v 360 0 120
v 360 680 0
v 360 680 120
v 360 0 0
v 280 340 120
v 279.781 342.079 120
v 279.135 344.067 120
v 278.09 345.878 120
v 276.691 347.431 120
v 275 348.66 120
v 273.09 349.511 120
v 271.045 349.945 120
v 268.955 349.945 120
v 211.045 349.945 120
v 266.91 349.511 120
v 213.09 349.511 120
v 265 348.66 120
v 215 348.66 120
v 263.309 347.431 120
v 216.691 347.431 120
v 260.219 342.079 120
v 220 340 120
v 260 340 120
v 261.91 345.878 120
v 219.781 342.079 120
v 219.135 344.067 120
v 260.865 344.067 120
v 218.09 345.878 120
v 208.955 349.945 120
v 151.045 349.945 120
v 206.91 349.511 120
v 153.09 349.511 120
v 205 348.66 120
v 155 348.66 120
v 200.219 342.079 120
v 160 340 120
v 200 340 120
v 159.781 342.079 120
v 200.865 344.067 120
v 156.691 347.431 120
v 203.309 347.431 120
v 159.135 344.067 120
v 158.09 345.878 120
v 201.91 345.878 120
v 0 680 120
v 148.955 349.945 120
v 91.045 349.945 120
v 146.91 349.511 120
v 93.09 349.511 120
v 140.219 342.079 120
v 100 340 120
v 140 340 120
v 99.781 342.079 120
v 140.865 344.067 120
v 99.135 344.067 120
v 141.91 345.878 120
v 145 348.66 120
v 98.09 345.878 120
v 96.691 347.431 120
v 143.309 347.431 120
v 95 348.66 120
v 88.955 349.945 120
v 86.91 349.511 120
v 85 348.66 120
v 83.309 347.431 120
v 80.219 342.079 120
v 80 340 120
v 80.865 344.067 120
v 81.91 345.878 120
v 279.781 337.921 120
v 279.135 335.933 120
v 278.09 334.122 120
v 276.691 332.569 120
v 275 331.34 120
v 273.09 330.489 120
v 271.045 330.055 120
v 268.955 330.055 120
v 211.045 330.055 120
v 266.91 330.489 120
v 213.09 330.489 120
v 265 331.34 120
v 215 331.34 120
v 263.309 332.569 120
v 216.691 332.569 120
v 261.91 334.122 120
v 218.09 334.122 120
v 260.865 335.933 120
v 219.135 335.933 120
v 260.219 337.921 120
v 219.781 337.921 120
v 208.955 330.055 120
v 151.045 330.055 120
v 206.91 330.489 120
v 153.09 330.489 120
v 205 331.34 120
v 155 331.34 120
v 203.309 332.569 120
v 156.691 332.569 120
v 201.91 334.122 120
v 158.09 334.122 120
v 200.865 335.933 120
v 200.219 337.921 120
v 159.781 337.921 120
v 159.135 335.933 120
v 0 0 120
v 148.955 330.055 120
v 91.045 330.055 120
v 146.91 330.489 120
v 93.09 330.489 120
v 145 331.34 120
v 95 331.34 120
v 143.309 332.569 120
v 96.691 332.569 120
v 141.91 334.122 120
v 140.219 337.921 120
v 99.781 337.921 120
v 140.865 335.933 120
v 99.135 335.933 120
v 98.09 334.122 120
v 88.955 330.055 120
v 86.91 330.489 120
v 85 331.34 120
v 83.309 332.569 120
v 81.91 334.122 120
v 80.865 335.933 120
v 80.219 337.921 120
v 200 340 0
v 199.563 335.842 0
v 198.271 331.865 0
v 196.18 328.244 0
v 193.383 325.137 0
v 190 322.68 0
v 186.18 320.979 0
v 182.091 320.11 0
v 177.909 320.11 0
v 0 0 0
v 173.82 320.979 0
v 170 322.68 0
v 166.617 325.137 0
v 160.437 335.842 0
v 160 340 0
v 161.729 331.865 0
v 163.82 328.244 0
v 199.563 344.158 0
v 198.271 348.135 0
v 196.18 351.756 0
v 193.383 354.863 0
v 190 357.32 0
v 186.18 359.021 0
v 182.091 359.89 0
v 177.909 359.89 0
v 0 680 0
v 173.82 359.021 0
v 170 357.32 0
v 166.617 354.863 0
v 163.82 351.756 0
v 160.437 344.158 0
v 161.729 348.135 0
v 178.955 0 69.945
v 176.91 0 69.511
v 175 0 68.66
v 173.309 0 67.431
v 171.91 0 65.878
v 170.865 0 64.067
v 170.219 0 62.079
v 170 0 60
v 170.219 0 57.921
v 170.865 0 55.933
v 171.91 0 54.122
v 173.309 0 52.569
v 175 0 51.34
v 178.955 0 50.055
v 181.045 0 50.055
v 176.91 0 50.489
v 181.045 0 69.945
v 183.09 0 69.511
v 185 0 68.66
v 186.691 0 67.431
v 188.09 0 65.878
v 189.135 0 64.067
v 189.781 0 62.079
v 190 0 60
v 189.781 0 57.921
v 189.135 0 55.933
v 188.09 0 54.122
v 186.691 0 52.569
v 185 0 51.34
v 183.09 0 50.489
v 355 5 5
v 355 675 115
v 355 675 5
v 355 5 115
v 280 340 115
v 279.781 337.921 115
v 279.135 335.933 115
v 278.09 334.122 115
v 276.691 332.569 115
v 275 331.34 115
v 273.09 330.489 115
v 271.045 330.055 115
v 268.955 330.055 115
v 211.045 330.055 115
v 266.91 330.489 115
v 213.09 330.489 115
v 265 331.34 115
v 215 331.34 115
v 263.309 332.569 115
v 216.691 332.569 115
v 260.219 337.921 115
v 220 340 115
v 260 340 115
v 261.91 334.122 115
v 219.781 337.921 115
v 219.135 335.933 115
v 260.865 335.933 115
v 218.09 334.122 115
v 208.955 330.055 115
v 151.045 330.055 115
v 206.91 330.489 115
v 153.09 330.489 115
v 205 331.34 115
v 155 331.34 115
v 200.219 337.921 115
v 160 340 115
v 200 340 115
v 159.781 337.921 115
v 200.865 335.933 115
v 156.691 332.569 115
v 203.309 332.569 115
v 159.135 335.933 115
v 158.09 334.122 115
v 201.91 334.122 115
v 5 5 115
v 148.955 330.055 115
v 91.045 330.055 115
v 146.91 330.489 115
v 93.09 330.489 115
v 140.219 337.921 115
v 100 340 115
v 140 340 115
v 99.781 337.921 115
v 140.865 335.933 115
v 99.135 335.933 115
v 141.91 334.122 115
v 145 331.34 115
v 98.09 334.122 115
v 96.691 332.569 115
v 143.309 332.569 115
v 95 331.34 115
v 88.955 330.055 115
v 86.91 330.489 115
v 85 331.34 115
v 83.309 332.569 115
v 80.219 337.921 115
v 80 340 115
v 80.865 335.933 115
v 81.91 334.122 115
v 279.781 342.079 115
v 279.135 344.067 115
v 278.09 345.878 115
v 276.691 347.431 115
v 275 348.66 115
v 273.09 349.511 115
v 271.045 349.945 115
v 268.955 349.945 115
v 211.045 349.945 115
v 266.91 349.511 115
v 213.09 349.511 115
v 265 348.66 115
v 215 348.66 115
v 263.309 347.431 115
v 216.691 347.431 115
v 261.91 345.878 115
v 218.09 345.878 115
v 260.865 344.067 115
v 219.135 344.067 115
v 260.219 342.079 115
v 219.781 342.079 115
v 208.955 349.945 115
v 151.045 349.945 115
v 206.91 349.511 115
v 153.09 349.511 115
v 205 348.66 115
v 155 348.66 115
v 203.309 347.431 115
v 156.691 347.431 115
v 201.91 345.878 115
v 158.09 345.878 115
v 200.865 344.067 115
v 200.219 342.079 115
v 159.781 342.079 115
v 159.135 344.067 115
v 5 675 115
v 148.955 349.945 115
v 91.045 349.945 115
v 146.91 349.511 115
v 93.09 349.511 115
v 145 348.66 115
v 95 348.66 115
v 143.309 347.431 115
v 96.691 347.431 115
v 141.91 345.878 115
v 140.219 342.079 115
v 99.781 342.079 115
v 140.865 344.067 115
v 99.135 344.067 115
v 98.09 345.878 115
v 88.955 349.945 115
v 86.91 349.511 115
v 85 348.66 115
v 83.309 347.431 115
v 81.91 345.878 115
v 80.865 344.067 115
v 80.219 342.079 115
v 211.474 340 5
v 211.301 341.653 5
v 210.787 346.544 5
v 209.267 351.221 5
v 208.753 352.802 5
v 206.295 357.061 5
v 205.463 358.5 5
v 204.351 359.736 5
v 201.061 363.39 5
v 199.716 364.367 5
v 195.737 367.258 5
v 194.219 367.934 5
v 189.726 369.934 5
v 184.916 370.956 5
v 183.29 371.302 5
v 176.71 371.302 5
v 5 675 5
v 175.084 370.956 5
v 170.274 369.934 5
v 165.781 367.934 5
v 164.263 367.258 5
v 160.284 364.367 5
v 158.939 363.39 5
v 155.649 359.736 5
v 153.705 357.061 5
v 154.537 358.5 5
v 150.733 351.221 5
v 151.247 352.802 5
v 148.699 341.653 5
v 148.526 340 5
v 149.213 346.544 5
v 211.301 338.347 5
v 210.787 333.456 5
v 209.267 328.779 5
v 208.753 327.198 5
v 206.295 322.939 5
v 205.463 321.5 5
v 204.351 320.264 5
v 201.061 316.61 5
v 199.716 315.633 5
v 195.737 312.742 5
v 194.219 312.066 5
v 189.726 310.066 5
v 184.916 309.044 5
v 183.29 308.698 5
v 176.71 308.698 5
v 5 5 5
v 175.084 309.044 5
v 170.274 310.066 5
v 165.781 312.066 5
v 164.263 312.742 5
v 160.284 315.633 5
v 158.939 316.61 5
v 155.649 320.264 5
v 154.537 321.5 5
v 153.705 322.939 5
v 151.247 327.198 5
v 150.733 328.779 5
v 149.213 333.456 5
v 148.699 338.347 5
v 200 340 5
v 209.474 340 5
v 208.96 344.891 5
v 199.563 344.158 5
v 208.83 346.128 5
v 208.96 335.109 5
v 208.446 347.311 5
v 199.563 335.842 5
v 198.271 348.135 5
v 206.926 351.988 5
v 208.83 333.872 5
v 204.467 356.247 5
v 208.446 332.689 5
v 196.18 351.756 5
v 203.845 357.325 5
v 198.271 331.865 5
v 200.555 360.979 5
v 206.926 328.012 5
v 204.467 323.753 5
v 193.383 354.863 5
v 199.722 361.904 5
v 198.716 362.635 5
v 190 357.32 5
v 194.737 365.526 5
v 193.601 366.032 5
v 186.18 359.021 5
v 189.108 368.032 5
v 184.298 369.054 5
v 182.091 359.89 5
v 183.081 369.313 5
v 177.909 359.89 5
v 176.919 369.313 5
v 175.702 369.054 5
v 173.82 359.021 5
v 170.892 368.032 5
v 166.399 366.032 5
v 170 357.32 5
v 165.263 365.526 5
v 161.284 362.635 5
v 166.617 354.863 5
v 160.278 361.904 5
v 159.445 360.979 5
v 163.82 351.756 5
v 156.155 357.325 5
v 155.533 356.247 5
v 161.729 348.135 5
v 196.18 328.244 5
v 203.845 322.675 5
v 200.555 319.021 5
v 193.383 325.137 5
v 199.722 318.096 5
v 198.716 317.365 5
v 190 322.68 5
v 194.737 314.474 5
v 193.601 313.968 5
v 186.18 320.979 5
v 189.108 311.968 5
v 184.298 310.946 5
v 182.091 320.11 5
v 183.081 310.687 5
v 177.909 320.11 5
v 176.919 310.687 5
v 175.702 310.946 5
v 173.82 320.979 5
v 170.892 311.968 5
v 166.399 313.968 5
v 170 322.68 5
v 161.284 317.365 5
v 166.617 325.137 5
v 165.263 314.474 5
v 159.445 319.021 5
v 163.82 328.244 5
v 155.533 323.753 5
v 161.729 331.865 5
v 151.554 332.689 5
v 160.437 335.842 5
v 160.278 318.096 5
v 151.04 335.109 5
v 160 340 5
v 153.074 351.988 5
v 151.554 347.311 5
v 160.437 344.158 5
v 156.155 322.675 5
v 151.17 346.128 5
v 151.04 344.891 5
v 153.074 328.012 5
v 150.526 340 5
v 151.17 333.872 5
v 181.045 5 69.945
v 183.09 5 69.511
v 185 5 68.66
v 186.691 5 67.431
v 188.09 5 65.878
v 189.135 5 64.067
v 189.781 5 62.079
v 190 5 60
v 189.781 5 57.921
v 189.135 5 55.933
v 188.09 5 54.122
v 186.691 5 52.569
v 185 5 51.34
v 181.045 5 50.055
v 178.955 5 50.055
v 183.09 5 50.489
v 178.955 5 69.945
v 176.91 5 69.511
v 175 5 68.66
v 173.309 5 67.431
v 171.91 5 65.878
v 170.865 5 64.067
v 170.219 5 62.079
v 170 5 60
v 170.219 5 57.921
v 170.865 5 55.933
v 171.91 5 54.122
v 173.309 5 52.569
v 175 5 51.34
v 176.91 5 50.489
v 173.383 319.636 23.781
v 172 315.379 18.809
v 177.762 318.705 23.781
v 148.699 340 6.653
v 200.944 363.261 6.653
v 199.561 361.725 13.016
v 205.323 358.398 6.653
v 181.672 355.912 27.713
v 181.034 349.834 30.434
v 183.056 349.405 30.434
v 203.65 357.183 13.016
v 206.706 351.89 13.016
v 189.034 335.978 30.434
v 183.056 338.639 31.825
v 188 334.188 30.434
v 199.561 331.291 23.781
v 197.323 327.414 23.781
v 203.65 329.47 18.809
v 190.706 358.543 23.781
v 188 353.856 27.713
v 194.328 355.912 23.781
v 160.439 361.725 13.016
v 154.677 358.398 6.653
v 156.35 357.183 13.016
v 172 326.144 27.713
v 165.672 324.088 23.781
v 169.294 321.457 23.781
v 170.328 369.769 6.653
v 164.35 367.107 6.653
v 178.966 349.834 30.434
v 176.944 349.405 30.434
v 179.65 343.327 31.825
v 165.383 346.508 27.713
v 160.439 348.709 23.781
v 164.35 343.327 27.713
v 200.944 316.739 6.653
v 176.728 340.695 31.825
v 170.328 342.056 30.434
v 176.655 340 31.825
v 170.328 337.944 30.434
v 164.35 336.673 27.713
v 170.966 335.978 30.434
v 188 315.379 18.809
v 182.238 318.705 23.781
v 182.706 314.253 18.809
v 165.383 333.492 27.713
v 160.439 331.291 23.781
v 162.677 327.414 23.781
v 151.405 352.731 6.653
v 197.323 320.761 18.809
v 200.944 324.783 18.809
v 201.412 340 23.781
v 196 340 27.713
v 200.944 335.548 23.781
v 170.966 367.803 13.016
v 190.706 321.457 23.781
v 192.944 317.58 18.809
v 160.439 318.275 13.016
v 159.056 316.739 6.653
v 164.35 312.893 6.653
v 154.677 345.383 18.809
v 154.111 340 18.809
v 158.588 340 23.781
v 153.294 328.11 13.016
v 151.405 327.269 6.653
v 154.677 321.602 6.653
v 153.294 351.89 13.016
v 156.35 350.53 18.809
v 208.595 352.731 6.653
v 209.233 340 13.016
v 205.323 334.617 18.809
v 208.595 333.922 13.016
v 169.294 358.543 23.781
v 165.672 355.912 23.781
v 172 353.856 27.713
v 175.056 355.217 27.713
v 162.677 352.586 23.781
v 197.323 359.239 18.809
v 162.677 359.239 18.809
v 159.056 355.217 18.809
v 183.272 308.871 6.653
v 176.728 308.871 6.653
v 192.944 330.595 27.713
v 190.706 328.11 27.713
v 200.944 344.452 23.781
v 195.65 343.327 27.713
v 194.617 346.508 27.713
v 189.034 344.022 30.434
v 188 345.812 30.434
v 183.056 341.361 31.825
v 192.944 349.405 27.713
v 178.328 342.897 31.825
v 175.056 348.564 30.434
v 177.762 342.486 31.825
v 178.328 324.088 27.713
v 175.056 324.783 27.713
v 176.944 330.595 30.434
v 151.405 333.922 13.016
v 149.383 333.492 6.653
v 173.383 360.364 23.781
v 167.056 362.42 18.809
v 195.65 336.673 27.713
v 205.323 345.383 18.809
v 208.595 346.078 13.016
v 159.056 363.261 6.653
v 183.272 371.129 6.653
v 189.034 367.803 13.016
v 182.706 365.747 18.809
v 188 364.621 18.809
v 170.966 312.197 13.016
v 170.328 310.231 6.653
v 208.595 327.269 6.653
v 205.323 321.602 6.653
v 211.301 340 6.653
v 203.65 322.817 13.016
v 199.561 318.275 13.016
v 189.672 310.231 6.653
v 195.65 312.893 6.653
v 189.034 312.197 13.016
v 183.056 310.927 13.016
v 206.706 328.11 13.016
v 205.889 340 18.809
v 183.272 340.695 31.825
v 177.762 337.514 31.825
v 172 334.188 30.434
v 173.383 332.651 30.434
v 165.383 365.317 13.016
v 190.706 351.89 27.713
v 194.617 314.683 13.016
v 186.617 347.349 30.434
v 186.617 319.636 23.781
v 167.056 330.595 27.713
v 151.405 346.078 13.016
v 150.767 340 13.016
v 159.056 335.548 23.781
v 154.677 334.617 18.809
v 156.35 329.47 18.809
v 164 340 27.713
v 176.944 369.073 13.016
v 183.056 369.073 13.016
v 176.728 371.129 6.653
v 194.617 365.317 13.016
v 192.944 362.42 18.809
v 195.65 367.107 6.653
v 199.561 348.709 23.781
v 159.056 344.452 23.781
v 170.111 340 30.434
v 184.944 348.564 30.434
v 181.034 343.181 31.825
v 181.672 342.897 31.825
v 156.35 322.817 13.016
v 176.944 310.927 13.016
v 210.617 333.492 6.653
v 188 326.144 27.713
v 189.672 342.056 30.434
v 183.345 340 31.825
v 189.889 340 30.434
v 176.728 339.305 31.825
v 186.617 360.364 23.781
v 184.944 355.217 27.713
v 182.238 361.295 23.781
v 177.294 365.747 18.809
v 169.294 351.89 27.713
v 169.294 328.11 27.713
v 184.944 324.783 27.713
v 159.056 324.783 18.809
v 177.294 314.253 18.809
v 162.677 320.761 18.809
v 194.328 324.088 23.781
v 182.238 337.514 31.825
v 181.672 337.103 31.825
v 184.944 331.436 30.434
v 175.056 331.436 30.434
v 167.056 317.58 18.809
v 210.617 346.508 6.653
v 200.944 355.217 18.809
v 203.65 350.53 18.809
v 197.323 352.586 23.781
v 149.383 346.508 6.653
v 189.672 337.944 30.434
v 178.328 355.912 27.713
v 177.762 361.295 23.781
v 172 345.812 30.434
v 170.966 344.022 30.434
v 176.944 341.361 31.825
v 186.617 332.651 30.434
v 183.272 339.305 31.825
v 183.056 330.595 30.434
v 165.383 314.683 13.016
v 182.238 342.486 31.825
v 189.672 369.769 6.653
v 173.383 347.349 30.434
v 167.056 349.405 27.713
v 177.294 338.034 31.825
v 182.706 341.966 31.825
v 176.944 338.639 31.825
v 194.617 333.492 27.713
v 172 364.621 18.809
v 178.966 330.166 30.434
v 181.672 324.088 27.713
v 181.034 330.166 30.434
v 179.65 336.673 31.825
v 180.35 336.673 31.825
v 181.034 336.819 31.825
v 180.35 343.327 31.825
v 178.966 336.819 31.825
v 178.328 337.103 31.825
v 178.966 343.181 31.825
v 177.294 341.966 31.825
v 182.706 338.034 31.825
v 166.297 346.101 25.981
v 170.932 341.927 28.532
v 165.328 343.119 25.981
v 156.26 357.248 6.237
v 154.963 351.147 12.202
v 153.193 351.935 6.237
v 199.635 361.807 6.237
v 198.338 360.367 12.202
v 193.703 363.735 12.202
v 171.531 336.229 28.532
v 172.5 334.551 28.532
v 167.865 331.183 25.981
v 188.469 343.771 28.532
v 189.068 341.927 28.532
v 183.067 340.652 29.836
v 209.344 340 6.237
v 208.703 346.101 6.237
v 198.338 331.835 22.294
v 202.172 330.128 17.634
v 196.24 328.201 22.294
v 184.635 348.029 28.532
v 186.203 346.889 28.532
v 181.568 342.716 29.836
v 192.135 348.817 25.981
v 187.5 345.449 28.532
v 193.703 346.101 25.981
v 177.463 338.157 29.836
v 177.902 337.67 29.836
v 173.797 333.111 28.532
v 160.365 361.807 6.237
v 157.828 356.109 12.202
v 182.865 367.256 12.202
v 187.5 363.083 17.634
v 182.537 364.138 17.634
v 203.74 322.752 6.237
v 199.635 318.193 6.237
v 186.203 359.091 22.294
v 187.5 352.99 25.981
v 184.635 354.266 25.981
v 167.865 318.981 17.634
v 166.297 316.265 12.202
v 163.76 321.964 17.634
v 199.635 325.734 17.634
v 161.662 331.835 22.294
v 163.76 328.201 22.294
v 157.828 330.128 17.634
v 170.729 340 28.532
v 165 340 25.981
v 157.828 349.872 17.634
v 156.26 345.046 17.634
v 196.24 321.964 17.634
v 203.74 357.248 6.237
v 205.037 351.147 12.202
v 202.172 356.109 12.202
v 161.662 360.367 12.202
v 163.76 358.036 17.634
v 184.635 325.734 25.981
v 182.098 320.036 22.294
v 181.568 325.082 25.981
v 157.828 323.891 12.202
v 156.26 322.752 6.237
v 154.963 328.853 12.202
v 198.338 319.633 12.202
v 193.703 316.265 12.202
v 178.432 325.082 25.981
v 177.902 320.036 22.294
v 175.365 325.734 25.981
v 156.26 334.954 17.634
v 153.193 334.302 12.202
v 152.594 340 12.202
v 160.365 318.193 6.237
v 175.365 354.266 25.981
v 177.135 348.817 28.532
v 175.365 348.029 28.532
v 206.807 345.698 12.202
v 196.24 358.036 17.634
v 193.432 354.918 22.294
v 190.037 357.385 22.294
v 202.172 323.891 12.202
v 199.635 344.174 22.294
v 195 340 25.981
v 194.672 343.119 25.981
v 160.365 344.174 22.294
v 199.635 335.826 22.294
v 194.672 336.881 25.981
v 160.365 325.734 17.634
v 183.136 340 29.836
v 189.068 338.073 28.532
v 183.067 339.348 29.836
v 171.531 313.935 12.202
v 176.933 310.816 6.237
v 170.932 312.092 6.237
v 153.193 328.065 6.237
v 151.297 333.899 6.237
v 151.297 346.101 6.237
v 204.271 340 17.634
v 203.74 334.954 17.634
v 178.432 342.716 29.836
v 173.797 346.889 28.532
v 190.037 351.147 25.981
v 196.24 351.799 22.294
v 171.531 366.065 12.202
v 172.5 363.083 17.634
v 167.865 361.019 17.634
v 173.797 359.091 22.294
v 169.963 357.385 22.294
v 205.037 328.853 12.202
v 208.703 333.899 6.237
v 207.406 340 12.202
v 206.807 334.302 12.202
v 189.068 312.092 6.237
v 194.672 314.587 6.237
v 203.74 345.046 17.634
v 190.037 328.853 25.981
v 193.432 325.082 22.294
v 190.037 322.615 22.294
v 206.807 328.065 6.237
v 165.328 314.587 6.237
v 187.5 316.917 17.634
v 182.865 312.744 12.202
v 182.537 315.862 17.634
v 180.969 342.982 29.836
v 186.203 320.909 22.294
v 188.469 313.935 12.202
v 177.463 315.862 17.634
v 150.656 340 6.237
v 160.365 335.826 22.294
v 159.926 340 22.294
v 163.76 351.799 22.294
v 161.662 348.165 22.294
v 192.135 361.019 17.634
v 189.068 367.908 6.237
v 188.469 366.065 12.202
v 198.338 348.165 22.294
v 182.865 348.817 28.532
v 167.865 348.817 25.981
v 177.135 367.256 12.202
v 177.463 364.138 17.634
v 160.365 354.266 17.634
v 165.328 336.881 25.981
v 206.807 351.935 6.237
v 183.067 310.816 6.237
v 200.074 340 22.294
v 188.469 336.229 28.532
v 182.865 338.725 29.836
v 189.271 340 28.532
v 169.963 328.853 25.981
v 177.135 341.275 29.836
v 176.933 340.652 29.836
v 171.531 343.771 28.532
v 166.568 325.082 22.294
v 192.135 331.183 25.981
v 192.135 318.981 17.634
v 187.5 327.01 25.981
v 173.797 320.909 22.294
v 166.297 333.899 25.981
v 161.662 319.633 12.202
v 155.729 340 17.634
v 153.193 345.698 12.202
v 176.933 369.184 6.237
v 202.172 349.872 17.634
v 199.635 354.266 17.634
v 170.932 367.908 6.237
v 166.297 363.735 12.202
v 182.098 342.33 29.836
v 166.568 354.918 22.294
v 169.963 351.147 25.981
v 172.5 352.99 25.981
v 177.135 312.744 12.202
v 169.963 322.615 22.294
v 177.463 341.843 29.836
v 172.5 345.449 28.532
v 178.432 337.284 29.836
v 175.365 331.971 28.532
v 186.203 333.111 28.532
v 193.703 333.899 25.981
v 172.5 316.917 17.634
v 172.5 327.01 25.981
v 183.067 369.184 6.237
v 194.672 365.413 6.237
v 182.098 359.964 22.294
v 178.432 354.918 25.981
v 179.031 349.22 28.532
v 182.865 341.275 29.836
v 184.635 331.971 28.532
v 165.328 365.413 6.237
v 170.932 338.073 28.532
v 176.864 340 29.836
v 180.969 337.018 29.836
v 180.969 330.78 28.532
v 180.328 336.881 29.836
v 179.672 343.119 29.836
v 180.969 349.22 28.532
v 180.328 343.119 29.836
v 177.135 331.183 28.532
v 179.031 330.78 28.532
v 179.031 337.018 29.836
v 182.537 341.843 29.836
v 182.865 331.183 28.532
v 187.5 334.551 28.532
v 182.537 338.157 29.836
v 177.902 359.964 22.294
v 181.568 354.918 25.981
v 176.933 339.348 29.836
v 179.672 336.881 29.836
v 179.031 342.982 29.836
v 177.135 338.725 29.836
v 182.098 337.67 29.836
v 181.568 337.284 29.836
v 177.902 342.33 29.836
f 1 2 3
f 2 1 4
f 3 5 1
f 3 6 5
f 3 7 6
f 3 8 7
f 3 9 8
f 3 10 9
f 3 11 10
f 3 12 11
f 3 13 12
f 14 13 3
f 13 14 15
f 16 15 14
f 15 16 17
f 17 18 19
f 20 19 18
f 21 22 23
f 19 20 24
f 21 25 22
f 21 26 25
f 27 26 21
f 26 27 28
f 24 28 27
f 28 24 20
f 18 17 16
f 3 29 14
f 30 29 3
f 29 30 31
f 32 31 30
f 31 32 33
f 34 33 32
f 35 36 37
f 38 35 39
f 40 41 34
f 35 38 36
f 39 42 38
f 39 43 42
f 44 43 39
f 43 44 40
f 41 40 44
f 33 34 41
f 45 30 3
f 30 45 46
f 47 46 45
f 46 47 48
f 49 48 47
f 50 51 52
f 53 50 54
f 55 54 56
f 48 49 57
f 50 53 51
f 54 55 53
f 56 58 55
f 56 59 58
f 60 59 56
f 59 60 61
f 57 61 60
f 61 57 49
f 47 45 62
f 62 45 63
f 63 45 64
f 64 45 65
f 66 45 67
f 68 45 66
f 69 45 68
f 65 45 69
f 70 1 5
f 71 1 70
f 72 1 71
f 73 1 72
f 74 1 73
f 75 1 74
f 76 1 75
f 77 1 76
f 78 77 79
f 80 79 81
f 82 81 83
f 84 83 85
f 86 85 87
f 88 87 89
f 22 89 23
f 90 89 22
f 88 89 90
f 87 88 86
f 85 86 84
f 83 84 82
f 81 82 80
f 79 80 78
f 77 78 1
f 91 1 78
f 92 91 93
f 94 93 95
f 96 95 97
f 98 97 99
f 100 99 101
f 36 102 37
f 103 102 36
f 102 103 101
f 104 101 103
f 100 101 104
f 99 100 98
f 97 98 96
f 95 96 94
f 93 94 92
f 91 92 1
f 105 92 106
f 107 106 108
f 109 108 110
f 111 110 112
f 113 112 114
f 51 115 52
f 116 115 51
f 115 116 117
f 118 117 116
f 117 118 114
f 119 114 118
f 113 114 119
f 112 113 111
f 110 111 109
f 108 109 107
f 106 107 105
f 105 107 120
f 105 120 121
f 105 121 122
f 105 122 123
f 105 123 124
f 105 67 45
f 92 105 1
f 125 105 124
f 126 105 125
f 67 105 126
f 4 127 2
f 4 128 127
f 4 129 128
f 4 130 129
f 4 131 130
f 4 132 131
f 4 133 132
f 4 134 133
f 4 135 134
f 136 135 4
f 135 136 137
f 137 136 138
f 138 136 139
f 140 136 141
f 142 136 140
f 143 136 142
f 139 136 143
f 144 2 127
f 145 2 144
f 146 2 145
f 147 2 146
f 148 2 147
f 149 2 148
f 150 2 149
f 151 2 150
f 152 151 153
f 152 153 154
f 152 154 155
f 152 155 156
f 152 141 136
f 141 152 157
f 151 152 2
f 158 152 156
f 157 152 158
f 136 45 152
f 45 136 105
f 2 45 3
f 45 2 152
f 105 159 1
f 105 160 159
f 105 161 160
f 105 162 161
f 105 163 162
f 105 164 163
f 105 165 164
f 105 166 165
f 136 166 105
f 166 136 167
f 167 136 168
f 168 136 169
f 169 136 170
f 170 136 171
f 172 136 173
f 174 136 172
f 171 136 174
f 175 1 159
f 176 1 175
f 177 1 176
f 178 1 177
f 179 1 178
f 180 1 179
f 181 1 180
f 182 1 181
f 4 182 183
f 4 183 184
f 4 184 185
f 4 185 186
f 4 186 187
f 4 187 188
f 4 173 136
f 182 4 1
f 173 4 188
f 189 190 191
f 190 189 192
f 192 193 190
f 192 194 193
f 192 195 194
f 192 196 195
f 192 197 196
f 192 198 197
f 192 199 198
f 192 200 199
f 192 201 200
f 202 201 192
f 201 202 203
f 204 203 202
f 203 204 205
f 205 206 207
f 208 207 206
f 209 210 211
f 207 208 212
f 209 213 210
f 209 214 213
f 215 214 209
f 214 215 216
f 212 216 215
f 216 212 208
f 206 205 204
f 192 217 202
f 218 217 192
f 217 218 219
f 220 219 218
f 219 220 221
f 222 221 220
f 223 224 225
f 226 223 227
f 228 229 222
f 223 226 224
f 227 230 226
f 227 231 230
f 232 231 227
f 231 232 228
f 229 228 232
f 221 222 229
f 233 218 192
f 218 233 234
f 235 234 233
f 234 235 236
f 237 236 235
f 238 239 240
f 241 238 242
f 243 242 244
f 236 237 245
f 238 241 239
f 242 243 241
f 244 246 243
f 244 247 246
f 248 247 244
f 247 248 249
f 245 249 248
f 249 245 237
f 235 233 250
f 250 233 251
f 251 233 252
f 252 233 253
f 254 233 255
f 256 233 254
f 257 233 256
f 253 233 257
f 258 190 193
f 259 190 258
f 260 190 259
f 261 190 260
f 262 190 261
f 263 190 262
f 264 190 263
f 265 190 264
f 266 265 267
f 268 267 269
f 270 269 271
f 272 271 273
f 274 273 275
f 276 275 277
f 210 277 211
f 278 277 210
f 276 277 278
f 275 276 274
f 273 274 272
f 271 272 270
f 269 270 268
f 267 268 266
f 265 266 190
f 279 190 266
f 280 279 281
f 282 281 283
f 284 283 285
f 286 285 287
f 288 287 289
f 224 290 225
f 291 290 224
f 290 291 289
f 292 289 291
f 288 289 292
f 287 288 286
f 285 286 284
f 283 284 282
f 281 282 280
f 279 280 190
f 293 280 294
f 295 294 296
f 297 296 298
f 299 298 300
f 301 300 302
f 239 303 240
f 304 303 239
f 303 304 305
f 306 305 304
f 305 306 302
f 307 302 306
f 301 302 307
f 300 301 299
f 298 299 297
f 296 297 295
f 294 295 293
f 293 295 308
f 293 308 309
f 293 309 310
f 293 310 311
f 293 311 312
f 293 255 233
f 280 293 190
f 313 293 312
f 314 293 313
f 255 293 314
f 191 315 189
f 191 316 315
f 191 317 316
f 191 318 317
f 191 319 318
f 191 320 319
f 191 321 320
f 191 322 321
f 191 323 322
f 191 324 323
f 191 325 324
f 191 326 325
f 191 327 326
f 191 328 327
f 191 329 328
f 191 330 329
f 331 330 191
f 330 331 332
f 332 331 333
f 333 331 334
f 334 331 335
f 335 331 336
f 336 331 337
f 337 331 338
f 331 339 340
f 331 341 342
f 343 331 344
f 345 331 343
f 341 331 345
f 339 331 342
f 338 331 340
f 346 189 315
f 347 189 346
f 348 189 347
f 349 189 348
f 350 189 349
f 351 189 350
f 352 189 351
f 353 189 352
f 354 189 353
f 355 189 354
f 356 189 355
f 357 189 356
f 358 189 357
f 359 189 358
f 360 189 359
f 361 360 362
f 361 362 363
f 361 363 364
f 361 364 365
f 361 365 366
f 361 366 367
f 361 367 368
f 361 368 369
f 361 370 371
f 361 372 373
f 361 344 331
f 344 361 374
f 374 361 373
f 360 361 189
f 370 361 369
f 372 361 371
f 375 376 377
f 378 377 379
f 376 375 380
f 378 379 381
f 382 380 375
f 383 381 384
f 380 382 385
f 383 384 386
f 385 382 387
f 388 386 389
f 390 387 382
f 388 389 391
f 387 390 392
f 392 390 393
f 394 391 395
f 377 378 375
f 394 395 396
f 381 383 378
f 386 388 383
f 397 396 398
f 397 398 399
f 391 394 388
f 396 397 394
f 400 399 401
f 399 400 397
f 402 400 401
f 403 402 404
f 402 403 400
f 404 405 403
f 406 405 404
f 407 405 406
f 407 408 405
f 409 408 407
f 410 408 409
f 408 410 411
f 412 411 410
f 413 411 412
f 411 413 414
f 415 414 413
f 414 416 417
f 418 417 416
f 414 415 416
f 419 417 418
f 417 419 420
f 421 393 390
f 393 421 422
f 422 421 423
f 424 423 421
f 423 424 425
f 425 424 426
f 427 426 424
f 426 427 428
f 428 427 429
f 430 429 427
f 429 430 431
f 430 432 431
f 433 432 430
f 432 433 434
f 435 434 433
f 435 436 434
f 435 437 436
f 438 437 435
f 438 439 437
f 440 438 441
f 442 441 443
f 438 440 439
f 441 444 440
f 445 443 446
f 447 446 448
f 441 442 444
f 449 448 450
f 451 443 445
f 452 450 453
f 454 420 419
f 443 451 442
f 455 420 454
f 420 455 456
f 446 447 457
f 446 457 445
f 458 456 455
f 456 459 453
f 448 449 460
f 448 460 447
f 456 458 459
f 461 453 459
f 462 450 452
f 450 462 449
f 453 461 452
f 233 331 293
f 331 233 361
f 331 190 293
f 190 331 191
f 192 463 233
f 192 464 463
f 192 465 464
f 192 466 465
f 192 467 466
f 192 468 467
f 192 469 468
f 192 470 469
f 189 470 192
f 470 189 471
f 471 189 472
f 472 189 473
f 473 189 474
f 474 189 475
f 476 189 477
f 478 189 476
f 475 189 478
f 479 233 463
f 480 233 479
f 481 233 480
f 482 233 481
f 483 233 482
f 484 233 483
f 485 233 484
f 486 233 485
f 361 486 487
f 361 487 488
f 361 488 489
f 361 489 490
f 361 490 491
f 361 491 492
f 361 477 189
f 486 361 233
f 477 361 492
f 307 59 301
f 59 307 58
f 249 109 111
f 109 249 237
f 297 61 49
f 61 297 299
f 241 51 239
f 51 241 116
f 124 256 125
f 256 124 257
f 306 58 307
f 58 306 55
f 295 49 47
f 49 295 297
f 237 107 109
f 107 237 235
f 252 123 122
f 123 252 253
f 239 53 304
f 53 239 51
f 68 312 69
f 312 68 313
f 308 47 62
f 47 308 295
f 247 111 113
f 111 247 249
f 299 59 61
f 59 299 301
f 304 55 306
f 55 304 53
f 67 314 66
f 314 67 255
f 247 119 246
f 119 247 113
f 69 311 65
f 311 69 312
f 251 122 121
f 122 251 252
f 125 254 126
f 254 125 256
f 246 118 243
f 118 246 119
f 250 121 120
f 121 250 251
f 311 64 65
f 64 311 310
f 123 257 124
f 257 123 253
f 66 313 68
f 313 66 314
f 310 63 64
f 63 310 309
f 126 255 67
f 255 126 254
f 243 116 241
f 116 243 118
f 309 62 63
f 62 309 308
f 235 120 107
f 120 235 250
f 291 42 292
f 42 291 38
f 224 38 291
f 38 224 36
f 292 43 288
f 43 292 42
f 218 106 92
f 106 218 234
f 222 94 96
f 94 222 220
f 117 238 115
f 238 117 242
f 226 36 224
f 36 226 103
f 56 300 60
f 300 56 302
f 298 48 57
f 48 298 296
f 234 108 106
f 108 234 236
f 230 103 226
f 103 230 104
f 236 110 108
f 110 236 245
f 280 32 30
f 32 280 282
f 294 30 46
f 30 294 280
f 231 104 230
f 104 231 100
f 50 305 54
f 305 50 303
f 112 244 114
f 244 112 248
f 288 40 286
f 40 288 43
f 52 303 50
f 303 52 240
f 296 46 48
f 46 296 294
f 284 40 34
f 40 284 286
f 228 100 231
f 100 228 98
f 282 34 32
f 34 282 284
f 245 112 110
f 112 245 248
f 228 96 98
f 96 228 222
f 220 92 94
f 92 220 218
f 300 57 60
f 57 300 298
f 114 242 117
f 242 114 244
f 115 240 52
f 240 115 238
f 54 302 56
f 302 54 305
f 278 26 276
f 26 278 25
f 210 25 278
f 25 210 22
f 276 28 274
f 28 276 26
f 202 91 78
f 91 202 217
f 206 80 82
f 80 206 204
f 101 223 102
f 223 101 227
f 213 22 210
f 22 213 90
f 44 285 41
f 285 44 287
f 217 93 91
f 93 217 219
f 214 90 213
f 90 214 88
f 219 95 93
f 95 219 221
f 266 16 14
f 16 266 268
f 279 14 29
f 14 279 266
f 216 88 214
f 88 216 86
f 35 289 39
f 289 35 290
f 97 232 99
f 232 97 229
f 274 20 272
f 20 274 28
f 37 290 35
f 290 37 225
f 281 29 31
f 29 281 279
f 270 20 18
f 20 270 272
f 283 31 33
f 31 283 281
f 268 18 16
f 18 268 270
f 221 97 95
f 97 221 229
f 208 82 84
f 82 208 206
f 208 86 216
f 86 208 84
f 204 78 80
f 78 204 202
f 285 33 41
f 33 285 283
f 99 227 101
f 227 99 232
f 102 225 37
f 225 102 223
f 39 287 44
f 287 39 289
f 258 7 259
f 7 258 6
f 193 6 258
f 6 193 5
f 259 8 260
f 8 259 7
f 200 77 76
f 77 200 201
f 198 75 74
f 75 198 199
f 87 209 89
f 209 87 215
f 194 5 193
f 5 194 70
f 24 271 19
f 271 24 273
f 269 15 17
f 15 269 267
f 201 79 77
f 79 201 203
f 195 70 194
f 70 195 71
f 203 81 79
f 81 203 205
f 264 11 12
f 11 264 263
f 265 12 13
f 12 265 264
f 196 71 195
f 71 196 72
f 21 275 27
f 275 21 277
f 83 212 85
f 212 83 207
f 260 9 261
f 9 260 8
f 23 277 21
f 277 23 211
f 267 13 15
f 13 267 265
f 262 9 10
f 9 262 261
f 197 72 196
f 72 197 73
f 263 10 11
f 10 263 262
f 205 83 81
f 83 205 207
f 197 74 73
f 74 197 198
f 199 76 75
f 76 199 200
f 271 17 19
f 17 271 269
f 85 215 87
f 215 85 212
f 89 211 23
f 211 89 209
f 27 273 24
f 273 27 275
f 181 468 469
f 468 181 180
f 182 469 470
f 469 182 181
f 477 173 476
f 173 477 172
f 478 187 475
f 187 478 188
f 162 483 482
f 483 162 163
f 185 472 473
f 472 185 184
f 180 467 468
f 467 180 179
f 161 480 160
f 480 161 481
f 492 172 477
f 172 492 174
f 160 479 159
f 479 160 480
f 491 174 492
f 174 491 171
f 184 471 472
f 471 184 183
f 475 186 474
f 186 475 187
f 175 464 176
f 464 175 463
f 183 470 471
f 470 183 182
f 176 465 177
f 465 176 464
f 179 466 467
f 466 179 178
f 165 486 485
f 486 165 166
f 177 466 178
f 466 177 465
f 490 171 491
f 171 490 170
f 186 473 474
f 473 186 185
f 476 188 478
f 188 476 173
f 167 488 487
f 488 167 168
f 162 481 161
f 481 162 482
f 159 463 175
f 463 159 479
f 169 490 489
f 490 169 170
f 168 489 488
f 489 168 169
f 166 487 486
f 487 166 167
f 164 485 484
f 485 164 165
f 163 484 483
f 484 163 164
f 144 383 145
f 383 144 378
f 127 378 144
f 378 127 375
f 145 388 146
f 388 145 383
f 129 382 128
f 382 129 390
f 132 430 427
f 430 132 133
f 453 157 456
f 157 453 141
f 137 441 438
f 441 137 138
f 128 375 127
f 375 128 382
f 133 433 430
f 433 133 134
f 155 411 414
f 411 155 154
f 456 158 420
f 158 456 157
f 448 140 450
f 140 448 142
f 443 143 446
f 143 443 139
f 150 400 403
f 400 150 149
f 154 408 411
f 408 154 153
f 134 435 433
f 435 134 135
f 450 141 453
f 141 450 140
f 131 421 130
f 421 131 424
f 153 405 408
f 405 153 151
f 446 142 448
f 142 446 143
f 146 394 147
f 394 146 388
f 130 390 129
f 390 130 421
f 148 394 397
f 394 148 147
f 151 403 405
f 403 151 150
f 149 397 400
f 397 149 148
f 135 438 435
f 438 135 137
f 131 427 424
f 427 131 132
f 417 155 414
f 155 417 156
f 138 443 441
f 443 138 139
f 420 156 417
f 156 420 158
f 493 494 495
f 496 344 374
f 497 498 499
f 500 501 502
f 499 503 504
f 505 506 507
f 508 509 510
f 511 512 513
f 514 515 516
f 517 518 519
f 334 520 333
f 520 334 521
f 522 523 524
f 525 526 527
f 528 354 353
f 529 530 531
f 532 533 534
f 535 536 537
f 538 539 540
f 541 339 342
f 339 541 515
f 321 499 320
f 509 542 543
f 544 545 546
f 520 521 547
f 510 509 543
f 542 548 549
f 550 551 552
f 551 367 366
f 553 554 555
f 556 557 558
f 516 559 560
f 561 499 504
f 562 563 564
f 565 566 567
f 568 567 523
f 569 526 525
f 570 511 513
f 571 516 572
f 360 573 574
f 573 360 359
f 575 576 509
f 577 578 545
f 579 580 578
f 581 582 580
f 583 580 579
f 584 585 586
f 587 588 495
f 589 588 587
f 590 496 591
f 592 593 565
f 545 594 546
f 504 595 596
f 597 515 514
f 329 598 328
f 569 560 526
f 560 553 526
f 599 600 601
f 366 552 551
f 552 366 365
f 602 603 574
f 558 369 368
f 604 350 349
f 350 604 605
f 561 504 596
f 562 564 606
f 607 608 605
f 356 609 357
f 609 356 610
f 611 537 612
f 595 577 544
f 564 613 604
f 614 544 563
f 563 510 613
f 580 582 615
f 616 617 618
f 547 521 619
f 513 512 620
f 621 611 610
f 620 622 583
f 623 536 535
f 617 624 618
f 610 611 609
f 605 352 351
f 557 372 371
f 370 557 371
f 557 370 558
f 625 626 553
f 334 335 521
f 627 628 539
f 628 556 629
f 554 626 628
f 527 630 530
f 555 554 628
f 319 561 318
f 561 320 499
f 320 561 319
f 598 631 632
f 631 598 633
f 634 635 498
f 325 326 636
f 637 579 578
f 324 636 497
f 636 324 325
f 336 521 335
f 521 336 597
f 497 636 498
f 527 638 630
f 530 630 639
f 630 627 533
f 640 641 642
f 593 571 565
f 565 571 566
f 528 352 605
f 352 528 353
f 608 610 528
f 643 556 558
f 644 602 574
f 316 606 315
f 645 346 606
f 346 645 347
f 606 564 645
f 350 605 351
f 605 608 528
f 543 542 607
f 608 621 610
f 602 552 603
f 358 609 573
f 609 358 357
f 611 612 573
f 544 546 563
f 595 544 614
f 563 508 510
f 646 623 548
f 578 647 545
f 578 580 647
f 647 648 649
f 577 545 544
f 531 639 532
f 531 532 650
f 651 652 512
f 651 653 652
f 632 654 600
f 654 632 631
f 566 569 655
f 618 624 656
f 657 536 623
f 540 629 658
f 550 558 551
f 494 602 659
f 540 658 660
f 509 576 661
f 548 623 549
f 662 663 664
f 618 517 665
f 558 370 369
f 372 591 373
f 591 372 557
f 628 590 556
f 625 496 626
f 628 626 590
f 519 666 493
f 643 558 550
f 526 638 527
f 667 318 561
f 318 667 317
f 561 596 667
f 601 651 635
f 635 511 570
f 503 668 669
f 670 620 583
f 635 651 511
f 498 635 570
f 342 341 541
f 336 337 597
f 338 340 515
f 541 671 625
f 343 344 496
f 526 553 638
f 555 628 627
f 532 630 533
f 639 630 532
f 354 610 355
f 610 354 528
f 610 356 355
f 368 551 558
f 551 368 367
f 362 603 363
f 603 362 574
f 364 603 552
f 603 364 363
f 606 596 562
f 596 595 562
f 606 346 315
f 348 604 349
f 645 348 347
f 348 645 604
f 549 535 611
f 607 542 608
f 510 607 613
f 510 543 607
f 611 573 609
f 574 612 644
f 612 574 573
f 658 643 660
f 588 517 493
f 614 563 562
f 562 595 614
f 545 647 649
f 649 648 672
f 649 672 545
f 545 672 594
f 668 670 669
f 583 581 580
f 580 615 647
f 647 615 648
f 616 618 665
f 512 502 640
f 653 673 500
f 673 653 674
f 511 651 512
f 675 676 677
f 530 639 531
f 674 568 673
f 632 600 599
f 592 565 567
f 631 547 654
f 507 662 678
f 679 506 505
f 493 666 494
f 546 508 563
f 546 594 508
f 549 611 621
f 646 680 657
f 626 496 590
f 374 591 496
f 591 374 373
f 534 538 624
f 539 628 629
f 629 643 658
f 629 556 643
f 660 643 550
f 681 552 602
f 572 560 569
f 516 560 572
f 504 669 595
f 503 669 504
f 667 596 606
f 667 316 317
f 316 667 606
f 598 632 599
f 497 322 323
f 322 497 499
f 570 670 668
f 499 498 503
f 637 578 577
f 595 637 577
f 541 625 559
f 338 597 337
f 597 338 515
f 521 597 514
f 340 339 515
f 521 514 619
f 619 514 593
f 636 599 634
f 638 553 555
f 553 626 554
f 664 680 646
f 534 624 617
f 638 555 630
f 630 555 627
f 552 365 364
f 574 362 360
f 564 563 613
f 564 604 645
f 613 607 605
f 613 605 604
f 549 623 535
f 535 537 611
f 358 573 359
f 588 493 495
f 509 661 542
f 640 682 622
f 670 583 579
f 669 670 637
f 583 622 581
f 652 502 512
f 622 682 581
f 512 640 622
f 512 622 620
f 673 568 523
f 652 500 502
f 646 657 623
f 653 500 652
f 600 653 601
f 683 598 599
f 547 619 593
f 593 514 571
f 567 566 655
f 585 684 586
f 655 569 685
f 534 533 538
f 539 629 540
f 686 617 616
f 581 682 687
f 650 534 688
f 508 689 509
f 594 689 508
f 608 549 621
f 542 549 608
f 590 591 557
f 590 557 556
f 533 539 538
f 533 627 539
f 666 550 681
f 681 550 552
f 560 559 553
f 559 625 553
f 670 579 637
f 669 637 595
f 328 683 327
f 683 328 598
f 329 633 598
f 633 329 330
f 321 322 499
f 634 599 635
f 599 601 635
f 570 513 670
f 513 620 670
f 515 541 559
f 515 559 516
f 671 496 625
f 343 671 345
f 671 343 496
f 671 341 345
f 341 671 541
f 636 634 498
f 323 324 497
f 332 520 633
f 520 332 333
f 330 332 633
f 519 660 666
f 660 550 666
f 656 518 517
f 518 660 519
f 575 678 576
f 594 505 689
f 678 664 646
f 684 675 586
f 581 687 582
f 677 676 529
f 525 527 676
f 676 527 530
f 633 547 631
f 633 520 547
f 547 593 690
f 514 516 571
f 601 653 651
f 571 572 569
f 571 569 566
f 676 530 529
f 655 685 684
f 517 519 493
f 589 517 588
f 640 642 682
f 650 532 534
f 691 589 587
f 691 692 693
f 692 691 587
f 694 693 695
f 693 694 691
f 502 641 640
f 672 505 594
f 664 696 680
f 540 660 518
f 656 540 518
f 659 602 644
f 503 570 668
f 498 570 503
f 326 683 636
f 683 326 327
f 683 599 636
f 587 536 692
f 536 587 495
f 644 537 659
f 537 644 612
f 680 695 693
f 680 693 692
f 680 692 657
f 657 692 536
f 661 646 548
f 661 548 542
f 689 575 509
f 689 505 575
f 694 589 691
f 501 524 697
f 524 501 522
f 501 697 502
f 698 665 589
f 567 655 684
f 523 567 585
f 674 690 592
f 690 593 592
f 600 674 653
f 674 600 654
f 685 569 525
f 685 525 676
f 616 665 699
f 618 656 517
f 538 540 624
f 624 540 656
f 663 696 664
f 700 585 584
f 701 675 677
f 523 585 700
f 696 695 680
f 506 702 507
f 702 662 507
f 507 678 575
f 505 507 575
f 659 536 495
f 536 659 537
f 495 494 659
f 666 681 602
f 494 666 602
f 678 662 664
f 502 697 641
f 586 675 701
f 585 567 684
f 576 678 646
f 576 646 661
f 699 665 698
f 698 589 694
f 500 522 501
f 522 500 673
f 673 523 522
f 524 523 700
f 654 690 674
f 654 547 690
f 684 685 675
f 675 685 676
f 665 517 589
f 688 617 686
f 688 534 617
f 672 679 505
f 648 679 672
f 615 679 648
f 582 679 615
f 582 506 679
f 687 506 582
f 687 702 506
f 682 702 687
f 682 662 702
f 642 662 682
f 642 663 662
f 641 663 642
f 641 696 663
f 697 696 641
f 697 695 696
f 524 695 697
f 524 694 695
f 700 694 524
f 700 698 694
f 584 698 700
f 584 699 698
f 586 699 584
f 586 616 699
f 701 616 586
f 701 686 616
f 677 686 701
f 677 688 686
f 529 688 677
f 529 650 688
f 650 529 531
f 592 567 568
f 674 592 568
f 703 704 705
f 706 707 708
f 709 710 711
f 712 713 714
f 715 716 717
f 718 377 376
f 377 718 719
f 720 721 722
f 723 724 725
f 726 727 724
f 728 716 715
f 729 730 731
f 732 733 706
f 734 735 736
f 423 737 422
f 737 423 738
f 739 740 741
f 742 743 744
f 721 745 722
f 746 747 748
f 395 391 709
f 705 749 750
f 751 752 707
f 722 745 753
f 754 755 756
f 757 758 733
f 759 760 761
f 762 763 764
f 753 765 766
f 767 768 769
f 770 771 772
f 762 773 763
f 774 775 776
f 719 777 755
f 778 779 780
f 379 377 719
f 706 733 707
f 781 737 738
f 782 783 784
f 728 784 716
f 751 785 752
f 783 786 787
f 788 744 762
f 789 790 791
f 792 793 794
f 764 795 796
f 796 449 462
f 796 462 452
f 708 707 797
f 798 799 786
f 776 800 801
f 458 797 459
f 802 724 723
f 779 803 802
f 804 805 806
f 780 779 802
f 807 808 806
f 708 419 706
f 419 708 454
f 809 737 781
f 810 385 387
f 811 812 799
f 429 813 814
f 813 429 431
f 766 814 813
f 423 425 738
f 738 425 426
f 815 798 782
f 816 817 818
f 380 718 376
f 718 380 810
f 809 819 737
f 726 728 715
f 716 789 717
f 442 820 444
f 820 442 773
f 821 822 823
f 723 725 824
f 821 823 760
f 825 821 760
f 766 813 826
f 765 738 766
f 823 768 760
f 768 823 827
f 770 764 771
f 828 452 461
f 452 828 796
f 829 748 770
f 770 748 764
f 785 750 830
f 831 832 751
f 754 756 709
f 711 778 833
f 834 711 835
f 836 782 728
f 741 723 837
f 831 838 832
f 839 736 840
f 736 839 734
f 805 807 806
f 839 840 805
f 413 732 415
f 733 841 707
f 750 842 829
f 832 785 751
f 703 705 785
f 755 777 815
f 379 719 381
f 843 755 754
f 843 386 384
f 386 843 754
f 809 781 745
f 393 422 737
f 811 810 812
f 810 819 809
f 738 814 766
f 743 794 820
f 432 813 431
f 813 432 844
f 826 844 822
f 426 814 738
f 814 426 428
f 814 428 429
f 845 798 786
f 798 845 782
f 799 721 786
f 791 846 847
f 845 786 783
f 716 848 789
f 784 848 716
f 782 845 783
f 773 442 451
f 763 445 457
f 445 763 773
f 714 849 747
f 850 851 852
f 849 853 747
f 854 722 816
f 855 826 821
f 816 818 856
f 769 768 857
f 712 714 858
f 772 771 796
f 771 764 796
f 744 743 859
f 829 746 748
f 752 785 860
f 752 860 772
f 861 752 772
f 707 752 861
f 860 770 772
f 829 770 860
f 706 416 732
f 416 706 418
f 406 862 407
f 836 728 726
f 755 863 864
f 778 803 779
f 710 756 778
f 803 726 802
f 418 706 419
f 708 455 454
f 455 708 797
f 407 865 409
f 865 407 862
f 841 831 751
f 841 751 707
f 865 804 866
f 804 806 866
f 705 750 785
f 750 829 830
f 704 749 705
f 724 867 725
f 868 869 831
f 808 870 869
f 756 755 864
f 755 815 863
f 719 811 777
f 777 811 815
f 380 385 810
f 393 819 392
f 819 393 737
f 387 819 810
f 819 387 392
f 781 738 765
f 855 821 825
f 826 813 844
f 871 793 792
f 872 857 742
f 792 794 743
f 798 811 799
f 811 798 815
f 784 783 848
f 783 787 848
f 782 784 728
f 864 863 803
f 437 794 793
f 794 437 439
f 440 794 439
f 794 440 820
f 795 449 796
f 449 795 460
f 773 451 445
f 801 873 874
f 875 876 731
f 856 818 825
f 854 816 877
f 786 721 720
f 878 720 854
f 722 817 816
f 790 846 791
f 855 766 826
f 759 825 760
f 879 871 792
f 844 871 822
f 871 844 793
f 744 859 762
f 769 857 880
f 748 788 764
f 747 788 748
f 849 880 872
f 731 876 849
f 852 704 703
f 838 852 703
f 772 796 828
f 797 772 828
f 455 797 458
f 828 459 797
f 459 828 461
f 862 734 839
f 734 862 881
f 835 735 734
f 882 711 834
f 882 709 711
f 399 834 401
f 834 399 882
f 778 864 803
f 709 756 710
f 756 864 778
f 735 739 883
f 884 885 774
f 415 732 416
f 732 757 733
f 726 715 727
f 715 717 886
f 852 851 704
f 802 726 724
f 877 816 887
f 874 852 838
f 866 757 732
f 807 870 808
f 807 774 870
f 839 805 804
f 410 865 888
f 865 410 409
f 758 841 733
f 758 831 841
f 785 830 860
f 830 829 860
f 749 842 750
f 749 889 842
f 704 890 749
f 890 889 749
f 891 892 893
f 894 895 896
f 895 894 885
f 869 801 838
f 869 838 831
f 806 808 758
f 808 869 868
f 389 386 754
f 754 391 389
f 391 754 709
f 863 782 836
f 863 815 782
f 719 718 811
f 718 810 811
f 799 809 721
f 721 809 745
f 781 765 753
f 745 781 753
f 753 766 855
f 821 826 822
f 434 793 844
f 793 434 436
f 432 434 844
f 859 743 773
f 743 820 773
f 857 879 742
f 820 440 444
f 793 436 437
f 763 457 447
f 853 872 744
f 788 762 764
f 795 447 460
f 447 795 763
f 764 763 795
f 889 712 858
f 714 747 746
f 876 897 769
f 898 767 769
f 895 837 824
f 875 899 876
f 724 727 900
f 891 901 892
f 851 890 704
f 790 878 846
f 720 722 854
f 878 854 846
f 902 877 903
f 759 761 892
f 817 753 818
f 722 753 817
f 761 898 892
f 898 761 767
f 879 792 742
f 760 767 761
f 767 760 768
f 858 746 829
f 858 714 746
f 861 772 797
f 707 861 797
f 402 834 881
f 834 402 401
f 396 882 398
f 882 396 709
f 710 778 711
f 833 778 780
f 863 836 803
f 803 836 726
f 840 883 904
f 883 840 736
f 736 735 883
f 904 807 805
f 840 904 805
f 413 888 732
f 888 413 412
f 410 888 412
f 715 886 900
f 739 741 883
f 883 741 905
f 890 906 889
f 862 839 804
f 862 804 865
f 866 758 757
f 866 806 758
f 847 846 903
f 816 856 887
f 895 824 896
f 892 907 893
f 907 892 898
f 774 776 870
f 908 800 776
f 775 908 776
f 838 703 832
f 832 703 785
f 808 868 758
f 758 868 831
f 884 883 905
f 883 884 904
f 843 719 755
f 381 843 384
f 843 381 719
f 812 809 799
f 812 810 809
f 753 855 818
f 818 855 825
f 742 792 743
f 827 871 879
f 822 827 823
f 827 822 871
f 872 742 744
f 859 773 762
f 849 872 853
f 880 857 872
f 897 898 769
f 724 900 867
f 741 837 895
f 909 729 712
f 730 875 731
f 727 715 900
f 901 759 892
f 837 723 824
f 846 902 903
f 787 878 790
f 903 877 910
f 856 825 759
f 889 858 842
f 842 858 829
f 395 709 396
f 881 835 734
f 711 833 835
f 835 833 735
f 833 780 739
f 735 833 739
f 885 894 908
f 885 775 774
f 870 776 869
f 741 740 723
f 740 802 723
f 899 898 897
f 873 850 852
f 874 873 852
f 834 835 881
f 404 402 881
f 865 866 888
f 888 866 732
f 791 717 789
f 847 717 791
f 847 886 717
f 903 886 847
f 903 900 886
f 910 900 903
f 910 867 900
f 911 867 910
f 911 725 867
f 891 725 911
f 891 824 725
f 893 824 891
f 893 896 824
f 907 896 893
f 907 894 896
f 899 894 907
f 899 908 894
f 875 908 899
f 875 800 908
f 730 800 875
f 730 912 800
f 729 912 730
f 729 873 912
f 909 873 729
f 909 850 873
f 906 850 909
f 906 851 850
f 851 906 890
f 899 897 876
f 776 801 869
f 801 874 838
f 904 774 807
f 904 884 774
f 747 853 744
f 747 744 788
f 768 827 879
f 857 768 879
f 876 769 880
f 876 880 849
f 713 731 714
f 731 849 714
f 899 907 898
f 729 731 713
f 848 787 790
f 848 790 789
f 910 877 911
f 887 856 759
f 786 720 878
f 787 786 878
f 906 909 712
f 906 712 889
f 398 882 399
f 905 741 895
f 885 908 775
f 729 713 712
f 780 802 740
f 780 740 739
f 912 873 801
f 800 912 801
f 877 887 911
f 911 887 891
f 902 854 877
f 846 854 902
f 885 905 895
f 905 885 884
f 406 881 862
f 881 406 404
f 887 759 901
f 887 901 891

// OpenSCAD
pr=10;               //Pipeline Raduis
ph=20;              //pipeline Height
sr=10;               //Sensor Raduis
lr=20;               //Liquid Raduis
sn=4;               //Number of Sensors
sh=20;              // Sensor Height
ch=10;              //Circuit Height
cr=30;               //Circle Raduis
margin=sr*4;      //Distance between sensors and the Cube
x0=0;               //Origin for X
y0=0;               //Origin for Y
z0=0;               //Origin for Z
sl=4*sr;            //Distance Between Sensors

xc=x0+(sl*(sn+1))+(2*sr*sn)+(2*margin);               //Cube X Dim
yc=y0+(sr*2*4)+(cr*20);                                                 //Cube Y Dim
zc=z0+(sh*5)+(2*ch);                                            //Cube Z  Dim
xs=x0+margin+sl+sr;               //Sensors Positios x
ys=y0+(yc/2);               //Sensors Positios y
zs=z0+zc-sh;               //Sensors Positios z

thickness=5;               //Thickness of the 
difference(){
union(){
difference() {
difference() {
    translate([x0,y0,z0]) 
    cube([xc,yc,zc]);
    translate([x0+thickness,y0+thickness,z0+thickness]) 
    cube([xc-(thickness*2),yc-(thickness*2),zc-(thickness*2)]);
     echo("omar");  

    
}

for(i=[0:1:sn-1])
    {
    translate([xs+(i*(sl+2*sr)),ys,zs])
    cylinder(h=sh, r1=sr , r2=sr, center=false); 
      echo(i);  
    }
    translate([xc/2,2*sr,zc/2])
rotate([90,0,0])
cylinder(h=ph, r1=pr , r2=pr, center=false); 
    rotate([0,0,0])

translate ([xc/2,yc/2,0])
cylinder(h=sl, r1=lr , r2=lr, center=false); 
 
    
}

translate ([xc/2,yc/2,0])
difference (){
sphere(r = cr+2);
sphere(r=cr);
rotate([180,0,0])    
cylinder(h=cr+2, r1=cr+2 , r2=cr+2, center=false); 
    

}




}









}
